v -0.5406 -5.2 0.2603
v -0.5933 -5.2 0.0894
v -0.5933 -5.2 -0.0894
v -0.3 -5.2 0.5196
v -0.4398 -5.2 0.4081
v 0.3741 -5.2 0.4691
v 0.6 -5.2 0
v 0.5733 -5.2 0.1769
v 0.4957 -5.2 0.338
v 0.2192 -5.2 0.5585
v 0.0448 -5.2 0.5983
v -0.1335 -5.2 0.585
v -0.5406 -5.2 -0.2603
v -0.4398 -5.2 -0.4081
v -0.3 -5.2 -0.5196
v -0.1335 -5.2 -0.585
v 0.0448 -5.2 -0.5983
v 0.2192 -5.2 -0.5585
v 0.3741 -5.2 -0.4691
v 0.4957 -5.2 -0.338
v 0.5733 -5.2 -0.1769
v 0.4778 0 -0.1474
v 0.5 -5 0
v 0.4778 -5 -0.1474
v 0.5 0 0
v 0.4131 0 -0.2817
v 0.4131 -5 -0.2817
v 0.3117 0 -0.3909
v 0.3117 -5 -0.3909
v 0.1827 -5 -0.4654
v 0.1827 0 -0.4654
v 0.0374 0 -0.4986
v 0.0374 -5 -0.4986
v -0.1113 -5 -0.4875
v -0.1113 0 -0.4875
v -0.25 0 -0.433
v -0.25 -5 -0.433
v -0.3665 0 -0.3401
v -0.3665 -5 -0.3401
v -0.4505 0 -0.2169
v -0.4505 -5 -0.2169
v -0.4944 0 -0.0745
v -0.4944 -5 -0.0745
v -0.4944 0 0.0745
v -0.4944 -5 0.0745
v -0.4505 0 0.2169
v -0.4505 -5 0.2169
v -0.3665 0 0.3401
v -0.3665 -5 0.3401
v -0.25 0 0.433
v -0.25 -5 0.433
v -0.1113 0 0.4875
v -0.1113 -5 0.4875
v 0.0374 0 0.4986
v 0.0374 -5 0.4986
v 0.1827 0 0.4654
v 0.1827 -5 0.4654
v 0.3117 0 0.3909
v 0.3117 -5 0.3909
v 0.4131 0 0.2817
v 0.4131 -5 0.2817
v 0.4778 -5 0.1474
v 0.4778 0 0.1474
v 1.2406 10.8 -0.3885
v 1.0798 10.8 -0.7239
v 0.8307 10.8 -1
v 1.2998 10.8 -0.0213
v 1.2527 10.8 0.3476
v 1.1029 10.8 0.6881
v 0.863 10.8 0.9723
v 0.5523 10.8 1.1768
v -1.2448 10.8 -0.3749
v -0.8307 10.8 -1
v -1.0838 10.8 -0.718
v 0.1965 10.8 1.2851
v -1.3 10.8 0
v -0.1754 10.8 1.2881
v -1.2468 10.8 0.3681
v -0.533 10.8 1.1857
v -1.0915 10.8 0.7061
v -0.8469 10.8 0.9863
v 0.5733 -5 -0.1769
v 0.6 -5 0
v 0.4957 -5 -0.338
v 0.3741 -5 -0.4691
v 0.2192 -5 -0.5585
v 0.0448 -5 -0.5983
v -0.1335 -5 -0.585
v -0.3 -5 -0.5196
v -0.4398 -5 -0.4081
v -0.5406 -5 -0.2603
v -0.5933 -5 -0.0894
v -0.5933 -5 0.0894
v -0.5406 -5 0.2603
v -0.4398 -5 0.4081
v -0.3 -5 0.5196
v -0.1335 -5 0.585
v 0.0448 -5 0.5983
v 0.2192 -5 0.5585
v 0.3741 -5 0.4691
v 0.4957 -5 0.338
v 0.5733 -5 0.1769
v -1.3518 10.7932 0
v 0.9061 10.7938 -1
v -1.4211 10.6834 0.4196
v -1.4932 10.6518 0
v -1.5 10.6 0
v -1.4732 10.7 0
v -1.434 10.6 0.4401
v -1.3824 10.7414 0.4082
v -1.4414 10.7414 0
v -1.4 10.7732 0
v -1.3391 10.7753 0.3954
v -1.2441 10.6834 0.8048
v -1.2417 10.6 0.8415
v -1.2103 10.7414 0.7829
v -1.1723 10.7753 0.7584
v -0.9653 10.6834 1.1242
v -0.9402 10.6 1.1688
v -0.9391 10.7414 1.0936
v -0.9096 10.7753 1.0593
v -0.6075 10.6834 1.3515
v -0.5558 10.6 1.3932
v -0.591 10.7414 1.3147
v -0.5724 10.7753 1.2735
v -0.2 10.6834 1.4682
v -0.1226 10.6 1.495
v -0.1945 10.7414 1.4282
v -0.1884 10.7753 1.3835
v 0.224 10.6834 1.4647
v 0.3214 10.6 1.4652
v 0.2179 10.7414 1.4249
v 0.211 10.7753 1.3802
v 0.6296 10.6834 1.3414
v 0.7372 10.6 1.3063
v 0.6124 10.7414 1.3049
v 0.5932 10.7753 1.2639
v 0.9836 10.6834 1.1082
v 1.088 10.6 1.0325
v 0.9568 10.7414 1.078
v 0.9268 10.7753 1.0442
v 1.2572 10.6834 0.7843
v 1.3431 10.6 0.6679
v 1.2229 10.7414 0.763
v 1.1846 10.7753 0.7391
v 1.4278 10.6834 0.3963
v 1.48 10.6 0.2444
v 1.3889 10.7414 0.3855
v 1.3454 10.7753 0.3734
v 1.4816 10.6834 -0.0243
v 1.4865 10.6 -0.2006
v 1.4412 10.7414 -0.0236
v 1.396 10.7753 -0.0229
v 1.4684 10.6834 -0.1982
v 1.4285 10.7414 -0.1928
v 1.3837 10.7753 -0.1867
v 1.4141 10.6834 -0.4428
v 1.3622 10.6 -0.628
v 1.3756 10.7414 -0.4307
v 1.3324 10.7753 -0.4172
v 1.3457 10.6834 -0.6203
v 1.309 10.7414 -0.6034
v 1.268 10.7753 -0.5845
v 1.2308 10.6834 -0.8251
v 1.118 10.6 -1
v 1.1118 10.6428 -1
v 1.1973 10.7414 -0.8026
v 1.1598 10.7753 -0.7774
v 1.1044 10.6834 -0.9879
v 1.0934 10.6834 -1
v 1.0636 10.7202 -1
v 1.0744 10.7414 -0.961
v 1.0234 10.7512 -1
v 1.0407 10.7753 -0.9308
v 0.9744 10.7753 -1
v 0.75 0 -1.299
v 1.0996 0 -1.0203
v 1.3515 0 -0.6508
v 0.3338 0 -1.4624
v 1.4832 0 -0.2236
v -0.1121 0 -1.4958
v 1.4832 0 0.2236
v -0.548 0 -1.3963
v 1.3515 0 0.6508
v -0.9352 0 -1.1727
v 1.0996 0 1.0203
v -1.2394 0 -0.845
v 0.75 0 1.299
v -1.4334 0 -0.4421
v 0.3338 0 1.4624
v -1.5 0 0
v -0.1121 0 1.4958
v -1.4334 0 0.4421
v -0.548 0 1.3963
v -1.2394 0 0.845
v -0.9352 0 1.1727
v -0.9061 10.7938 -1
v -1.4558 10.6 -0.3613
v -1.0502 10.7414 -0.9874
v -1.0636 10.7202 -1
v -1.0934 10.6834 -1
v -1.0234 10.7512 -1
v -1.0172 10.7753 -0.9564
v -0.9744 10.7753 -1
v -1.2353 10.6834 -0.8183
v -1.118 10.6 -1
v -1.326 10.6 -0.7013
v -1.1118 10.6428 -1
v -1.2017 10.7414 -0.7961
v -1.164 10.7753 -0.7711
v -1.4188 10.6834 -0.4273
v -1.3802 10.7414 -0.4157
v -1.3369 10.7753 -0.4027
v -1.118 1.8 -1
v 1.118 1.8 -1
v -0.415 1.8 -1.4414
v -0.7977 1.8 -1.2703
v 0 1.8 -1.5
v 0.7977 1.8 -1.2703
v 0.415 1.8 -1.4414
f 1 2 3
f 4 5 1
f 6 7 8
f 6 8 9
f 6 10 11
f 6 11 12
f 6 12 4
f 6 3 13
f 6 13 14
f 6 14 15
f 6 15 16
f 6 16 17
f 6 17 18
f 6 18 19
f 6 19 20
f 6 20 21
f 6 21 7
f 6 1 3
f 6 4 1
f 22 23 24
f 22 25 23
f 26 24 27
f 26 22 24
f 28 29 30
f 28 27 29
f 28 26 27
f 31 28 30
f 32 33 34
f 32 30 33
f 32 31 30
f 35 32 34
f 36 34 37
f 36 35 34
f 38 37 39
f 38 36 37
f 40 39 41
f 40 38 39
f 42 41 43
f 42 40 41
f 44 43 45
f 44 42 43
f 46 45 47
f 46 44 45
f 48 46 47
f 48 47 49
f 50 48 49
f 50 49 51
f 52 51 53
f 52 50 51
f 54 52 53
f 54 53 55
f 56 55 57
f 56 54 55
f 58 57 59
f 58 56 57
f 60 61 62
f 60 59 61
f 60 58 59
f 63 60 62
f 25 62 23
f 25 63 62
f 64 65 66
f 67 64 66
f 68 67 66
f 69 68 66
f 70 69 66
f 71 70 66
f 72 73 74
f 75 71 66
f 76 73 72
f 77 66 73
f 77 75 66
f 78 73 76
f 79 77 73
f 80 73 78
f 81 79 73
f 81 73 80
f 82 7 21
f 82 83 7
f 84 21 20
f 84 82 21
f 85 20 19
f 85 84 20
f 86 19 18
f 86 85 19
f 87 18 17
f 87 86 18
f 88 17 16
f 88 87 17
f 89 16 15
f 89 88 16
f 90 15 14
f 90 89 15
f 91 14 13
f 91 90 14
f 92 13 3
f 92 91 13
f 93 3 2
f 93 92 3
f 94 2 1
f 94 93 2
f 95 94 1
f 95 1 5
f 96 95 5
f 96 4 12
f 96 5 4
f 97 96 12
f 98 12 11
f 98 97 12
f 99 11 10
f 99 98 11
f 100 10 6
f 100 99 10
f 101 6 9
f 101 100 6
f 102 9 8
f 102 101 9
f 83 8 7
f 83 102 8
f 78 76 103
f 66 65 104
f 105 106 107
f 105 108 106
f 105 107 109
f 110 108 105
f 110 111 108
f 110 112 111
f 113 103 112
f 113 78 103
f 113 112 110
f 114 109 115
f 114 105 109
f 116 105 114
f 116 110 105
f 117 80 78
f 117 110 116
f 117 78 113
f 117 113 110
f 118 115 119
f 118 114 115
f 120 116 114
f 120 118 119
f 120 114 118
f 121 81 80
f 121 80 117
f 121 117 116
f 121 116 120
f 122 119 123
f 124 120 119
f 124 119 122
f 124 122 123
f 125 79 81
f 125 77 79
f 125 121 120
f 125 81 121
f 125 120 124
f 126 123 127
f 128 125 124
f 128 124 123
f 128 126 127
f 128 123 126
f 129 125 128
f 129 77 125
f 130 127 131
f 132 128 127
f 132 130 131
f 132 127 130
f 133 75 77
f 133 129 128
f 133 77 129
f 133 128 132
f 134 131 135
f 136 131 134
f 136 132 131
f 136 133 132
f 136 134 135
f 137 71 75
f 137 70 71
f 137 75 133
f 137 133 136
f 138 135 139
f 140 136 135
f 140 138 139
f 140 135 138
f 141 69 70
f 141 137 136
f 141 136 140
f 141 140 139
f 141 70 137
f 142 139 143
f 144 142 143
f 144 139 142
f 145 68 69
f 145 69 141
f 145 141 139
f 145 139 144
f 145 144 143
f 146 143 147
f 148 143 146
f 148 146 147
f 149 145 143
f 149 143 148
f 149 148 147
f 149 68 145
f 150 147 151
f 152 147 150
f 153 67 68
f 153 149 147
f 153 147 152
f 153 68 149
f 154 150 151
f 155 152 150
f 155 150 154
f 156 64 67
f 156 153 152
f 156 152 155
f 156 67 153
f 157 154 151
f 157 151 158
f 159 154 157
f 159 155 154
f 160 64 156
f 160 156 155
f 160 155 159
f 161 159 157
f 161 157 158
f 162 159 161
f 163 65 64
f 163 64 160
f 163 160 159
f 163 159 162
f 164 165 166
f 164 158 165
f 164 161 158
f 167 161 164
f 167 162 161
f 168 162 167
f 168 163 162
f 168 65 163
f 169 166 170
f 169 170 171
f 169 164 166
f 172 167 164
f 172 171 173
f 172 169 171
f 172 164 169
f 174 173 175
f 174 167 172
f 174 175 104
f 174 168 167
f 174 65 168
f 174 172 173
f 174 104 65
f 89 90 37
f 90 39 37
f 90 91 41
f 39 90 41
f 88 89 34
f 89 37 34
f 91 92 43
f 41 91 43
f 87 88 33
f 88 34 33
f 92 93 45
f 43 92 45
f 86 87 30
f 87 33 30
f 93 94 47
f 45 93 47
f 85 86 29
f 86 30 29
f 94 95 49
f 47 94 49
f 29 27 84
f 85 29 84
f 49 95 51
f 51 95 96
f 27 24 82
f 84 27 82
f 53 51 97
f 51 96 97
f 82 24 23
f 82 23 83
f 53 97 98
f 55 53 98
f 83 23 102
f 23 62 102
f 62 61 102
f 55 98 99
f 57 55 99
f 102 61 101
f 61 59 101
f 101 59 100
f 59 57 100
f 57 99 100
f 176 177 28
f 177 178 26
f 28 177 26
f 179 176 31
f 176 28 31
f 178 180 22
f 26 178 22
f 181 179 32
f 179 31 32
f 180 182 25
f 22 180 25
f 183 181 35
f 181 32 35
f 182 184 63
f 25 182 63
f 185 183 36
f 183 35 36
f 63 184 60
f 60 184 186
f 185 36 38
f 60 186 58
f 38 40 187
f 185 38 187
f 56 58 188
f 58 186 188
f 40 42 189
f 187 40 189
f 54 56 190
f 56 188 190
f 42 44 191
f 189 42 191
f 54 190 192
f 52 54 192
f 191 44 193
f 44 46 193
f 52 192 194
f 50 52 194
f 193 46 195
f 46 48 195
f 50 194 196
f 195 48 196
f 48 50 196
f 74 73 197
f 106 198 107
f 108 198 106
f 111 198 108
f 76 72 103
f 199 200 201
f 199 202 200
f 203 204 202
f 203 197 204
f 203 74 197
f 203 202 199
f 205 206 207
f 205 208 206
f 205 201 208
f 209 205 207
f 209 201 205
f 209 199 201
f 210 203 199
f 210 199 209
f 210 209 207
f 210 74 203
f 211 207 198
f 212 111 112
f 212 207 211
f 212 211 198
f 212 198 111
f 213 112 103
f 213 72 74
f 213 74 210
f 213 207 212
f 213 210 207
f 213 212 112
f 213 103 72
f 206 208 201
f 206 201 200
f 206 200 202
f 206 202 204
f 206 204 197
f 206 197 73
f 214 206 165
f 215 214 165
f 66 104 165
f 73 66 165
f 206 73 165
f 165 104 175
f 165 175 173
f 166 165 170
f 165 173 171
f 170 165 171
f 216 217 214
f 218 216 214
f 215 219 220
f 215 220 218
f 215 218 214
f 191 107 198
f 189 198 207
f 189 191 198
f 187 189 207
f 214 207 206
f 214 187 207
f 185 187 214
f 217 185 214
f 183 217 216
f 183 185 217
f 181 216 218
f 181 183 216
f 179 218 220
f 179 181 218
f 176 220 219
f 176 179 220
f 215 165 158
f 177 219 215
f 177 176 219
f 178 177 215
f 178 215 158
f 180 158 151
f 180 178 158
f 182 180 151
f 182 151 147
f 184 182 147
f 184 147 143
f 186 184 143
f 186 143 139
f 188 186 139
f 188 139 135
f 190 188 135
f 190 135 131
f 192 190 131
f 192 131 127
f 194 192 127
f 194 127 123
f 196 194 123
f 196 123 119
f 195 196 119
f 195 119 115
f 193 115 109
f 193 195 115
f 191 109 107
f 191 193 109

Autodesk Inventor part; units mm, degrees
ref_plane "YZ Plane" through (0, 0, 0) normal (1, 0, 0) x (0, 1, 0)
ref_plane "XZ Plane" through (0, 0, 0) normal (0, 1, 0) x (-1, 0, 0)
ref_plane "XY Plane" through (0, 0, 0) normal (0, 0, 1) x (1, 0, 0)
sketch "Esboço1" plane through (0, 0, 0) normal (0, 1, 0) x (-1, 0, 0)
  circle A0 centre (0, 0) radius 1.5
  dimension "d0" = 3
extrude "Extrusão1" add sketch "Esboço1" along normal blind 10.8
sketch "Esboço2" plane through (0, 10.8, 0) normal (0, 1, 0) x (1, 0, 0)
  circle A0 centre (0, 0) radius 1.5 projected
  arc A1 (1.118, 1) -> (-1.118, 1) centre (0, 0) ccw
  line L0 (-1.118, 1) -> (1.118, 1)
  dimension "d3" = 0.5
extrude "Extrusão2" cut sketch "Esboço2" against normal blind 9 contours L0 A0 picked at (-0.0599, 1.1631)
sketch "Esboço3" plane through (0, 0, 0) normal (0, -1, 0) x (1, 0, 0)
  circle A0 centre (0, 0) radius 0.5
  dimension "d6" = 1
extrude "Extrusão3" add sketch "Esboço3" along normal blind 5
sketch "Esboço4" plane through (0, -5, 0) normal (0, -1, 0) x (1, 0, 0)
  circle A0 centre (0, 0) radius 0.6
  dimension "d9" = 1.2
extrude "Extrusão4" add sketch "Esboço4" along normal blind 0.2
fillet "Arredondamento1" radius 0.2 2 edges at (-1.4013, 10.8, -0.5352) (0.5352, 10.8, 1.4013)
properties part number "Eixo - Encaixe D"
